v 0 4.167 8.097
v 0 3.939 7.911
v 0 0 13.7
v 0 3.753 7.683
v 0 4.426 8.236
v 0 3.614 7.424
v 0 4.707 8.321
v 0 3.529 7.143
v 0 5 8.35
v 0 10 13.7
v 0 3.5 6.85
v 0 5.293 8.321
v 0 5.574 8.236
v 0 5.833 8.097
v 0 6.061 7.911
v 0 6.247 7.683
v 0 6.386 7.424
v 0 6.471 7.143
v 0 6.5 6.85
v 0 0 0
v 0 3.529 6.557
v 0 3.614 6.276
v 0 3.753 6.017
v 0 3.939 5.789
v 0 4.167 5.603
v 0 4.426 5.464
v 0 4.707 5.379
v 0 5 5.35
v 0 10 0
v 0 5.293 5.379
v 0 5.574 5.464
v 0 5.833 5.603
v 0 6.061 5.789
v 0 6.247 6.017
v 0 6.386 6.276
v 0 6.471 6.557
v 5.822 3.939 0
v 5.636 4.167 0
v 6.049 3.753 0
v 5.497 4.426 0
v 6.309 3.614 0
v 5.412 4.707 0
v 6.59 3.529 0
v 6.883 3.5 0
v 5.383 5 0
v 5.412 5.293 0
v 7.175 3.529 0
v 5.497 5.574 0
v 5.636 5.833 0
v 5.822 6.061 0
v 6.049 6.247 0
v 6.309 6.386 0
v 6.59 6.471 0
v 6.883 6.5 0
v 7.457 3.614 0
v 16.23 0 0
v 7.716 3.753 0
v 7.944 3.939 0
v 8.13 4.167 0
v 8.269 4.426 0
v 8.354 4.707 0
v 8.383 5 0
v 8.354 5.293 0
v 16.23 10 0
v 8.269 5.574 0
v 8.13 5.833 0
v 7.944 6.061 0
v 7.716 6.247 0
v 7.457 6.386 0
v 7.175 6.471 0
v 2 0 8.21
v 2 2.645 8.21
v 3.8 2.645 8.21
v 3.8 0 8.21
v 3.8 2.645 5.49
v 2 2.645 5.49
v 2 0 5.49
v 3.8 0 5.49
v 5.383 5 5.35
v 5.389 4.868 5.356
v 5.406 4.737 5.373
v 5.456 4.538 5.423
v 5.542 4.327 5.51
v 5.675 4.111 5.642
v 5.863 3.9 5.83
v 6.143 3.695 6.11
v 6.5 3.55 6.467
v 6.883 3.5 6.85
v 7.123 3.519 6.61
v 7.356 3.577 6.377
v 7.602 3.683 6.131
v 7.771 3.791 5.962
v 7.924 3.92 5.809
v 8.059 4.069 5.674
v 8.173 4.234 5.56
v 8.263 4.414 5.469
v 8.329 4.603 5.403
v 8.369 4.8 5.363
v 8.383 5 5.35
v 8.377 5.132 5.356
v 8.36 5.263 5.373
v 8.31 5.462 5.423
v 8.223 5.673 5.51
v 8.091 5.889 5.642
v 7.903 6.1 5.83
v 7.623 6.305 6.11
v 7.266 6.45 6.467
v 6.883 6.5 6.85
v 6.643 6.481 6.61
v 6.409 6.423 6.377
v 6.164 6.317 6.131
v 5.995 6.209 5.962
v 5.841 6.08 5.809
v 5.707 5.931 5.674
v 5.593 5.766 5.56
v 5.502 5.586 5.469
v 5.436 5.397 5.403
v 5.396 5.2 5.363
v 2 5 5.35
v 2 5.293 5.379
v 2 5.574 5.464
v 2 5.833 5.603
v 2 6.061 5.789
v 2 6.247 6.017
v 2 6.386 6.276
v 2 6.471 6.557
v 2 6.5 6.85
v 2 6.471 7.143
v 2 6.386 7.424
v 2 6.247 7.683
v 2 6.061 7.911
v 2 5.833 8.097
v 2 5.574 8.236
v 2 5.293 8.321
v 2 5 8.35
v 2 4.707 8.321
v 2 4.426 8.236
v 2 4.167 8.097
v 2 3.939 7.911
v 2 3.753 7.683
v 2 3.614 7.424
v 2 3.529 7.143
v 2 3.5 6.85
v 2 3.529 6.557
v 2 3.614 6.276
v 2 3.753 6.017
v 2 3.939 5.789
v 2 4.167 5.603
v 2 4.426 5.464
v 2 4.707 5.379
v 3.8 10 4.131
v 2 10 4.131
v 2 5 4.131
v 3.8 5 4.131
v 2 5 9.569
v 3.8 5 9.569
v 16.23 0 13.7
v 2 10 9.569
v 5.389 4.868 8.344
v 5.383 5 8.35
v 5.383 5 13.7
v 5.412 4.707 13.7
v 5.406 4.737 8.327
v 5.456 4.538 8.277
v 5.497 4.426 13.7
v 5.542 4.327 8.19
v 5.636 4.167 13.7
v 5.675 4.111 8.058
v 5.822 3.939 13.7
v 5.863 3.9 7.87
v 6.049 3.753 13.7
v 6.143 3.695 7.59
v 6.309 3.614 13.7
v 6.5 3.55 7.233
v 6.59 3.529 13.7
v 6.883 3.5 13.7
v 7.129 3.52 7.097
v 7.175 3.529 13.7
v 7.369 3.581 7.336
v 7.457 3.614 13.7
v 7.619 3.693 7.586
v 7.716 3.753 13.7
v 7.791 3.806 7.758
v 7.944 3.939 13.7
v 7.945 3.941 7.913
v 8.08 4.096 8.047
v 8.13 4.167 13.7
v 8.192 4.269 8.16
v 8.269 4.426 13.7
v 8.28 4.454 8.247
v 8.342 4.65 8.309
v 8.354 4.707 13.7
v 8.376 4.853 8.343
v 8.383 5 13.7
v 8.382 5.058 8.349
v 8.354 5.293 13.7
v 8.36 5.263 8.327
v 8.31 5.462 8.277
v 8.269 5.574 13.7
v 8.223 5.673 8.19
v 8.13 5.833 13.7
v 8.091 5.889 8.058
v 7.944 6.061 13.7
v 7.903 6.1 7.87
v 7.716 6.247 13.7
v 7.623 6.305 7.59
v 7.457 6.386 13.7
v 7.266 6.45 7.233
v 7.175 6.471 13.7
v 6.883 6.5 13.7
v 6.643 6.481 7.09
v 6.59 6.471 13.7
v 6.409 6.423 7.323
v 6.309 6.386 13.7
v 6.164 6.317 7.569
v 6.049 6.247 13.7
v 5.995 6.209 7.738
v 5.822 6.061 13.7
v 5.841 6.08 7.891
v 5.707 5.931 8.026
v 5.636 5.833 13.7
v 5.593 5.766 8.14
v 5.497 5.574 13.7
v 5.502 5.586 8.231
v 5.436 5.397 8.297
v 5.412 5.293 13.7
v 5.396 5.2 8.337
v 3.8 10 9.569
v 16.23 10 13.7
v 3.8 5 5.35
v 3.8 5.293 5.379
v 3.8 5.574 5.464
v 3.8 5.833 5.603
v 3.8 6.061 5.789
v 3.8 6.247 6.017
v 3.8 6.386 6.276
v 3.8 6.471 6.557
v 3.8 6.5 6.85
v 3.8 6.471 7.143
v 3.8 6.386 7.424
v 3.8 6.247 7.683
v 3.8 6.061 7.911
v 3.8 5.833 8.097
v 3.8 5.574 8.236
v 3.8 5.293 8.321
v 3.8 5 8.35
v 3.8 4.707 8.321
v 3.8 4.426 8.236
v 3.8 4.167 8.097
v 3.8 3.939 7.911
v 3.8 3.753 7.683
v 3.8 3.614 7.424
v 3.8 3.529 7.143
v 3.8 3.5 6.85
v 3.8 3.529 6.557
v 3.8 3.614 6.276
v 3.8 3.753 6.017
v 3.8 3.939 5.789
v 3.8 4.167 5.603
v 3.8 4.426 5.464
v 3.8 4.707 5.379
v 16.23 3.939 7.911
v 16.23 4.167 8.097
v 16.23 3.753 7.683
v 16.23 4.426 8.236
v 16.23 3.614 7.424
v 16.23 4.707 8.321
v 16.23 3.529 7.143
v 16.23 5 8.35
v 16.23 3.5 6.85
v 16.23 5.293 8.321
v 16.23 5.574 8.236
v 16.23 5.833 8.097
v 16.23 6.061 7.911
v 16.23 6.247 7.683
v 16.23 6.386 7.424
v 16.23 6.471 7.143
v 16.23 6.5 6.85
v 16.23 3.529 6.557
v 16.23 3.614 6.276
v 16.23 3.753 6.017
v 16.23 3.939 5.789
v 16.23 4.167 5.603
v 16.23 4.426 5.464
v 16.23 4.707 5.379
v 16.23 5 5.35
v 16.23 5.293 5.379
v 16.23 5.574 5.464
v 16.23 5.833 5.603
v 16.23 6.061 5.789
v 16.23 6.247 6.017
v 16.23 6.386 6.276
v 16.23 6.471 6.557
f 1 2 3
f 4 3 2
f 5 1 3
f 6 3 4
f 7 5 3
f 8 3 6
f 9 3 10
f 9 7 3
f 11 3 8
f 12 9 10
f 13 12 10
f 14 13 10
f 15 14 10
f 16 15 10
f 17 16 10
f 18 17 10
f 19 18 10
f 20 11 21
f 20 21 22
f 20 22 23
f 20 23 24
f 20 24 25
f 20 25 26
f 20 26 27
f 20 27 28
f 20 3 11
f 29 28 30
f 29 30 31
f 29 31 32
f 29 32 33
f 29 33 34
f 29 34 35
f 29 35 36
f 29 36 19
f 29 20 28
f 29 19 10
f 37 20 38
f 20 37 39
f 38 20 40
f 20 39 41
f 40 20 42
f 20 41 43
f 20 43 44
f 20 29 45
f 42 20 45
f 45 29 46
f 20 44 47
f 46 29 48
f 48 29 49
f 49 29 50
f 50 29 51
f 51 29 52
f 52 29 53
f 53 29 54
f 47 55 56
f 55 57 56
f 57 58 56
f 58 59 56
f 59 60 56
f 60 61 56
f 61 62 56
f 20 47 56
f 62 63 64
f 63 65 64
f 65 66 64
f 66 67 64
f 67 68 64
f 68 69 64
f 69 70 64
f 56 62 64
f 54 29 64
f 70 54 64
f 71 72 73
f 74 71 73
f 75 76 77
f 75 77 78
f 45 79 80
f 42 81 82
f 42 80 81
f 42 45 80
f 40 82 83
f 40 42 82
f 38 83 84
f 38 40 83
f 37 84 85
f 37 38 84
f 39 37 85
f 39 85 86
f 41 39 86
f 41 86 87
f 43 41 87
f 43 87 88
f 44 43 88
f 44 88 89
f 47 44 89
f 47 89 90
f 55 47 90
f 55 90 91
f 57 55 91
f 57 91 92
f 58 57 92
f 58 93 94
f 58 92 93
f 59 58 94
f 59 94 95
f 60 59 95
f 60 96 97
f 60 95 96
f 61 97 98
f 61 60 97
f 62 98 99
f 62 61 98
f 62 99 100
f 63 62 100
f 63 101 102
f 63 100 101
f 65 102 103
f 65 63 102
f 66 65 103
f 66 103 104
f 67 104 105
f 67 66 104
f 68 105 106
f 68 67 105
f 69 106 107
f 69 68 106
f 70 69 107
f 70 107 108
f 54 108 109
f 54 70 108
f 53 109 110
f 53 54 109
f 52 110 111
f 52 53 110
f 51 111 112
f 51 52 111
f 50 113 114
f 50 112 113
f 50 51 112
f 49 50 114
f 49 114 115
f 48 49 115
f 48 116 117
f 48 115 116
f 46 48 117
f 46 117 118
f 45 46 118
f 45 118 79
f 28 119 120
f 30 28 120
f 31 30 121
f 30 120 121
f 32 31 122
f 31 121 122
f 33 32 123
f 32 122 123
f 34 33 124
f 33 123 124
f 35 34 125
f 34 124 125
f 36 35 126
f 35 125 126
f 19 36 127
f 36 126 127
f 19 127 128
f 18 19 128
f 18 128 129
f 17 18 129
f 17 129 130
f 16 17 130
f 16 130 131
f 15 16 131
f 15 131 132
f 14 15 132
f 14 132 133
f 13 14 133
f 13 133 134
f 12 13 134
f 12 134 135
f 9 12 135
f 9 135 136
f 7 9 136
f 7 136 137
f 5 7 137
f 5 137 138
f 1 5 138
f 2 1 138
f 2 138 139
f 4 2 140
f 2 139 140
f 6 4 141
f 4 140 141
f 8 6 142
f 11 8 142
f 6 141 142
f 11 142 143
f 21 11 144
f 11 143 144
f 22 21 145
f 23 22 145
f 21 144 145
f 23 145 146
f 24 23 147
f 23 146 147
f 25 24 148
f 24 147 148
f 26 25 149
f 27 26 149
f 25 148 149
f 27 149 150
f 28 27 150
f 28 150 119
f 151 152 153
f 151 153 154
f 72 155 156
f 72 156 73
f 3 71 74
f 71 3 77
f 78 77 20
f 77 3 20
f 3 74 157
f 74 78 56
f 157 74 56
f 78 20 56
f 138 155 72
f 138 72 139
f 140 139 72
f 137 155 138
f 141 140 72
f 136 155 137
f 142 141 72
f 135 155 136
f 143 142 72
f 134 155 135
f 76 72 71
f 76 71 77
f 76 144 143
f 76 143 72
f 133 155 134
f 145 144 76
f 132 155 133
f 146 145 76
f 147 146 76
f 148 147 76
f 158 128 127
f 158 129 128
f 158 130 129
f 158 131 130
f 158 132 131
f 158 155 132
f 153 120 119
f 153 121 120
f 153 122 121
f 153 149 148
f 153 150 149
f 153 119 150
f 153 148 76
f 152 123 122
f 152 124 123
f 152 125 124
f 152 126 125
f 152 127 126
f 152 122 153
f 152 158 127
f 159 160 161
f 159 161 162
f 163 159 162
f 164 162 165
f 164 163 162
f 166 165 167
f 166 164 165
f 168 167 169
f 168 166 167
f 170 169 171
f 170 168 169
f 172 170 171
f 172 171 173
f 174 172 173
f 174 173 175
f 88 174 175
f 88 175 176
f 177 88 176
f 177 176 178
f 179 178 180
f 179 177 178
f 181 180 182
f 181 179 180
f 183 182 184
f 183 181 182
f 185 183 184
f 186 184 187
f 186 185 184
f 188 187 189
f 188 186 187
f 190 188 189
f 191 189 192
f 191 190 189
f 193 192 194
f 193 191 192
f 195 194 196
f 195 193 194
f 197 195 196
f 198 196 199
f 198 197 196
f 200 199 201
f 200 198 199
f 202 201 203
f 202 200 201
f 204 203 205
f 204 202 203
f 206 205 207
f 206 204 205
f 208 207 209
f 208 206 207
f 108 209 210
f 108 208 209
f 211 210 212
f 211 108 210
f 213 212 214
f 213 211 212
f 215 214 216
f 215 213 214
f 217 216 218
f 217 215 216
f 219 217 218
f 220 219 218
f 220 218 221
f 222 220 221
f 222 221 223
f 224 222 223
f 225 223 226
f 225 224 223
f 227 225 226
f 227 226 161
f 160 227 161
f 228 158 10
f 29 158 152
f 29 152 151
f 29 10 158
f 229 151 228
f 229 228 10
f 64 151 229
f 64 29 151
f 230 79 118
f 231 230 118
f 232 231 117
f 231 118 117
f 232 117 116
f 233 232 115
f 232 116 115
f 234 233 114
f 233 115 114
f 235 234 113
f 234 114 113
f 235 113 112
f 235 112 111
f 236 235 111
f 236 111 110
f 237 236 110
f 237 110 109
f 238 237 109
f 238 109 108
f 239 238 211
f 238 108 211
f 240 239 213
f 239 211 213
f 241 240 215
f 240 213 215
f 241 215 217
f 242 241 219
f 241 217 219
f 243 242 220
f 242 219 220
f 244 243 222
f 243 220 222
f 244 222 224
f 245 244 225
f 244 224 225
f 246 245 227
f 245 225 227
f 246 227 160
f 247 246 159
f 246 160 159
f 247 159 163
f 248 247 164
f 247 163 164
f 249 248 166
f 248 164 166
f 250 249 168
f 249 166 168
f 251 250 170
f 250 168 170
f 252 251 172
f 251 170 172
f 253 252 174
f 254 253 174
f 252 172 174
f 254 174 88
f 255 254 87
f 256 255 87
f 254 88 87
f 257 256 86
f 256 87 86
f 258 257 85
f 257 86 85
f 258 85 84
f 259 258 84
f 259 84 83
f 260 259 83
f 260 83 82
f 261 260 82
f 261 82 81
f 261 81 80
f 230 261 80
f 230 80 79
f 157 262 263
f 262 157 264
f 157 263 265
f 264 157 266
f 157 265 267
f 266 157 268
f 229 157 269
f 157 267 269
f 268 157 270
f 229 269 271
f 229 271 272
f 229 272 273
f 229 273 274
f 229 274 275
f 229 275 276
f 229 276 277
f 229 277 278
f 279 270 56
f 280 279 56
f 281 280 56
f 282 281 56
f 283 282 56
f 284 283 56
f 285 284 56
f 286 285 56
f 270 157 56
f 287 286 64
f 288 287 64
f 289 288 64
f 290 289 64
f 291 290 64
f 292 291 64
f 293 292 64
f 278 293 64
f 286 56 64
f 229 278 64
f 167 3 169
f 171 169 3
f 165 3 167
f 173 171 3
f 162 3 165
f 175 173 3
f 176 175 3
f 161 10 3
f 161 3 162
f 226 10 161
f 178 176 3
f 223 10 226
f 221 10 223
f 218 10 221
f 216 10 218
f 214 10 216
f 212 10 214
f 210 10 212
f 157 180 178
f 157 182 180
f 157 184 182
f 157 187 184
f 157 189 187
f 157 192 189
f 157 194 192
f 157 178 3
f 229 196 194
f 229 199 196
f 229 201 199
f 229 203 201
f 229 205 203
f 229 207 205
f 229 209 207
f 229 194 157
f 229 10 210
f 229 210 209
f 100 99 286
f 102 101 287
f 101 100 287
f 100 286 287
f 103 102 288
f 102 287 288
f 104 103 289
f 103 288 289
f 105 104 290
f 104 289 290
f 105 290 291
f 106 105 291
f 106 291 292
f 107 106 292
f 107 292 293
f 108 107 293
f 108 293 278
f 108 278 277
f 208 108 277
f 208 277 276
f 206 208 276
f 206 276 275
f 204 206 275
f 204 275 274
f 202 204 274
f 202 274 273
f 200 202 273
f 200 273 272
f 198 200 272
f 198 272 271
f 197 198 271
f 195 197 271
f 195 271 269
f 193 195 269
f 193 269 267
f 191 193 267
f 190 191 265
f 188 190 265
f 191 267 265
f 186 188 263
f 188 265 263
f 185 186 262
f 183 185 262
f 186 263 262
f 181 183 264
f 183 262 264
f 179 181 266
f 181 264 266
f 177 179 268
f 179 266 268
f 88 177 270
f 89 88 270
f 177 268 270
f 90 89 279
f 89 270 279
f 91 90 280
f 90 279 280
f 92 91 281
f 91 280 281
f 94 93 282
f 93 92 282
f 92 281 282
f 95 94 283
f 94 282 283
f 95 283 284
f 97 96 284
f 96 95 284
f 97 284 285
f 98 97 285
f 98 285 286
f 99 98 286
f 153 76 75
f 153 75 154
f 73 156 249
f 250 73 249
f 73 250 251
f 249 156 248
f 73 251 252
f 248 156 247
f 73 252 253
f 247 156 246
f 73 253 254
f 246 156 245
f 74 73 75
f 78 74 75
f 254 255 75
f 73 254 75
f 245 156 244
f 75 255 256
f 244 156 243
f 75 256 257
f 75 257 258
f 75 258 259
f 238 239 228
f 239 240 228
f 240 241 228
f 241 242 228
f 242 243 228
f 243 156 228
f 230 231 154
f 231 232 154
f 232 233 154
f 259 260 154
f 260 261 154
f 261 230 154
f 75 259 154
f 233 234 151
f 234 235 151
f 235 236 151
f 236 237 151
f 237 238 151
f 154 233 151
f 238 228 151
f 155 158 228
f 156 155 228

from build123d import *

# Parameters (mm, degrees)
SKETCH2_W           = 16.23
SKETCH2_H           = 10
SKETCH2_R           = 1.5
BOSS_EXTRUDE1_DEPTH = 13.7
SKETCH3_R           = 1.5
CUT_EXTRUDE1_DEPTH  = 24.47558093
CUT_EXTRUDE4_DEPTH  = 1.8
SKETCH7_W           = 1.8
SKETCH7_H           = 5.438639536
CUT_EXTRUDE5_DEPTH  = 5
SKETCH8_W           = 1.8
SKETCH8_H           = 2.719319768
CUT_EXTRUDE6_DEPTH  = 23.476630642


with BuildPart() as part:
    # Sketch2 → Boss-Extrude1 (new body)
    with BuildSketch(Plane.XY):
        with Locations((8.115, 5)):
            Rectangle(SKETCH2_W, SKETCH2_H)
        with Locations(Location((6.882853167, 5, 0), (0, 0, 180))):
            Circle(SKETCH2_R, mode=Mode.SUBTRACT)
    extrude(amount=BOSS_EXTRUDE1_DEPTH)

    # Sketch3 → Cut-Extrude1 (cut, through all)
    with BuildSketch(Plane(origin=(16.23, 0, 0), x_dir=(0, 0, -1), z_dir=(1, 0, 0))):
        with Locations((-6.85, 5)):
            Circle(SKETCH3_R)
    extrude(amount=-CUT_EXTRUDE1_DEPTH, mode=Mode.SUBTRACT)

    # Sketch4 → Cut-Extrude4 (cut)
    with BuildSketch(Plane(origin=(2, 0, 0), x_dir=(0, 0, -1), z_dir=(1, 0, 0))):
        Polygon((-5.490340116, 2.645), (-4.130680232, 5), (-5.490340116, 7.355), (-8.209659884, 7.355), (-9.569319768, 5), (-8.209659884, 2.645), align=None)
    extrude(amount=CUT_EXTRUDE4_DEPTH, mode=Mode.SUBTRACT)

    # Sketch7 → Cut-Extrude5 (cut)
    with BuildSketch(Plane(origin=(0, 10, 0), x_dir=(1, 0, 0), z_dir=(0, 1, 0))):
        with Locations((2.9, -6.85)):
            Rectangle(SKETCH7_W, SKETCH7_H)
    extrude(amount=-CUT_EXTRUDE5_DEPTH, mode=Mode.SUBTRACT)

    # Sketch8 → Cut-Extrude6 (cut, through all)
    with BuildSketch(Plane(origin=(0, 2.645, 0), x_dir=(1, 0, 0), z_dir=(0, 1, 0))):
        with Locations((2.9, -6.85)):
            Rectangle(SKETCH8_W, SKETCH8_H)
    extrude(amount=-CUT_EXTRUDE6_DEPTH, mode=Mode.SUBTRACT)


solid = part.part
